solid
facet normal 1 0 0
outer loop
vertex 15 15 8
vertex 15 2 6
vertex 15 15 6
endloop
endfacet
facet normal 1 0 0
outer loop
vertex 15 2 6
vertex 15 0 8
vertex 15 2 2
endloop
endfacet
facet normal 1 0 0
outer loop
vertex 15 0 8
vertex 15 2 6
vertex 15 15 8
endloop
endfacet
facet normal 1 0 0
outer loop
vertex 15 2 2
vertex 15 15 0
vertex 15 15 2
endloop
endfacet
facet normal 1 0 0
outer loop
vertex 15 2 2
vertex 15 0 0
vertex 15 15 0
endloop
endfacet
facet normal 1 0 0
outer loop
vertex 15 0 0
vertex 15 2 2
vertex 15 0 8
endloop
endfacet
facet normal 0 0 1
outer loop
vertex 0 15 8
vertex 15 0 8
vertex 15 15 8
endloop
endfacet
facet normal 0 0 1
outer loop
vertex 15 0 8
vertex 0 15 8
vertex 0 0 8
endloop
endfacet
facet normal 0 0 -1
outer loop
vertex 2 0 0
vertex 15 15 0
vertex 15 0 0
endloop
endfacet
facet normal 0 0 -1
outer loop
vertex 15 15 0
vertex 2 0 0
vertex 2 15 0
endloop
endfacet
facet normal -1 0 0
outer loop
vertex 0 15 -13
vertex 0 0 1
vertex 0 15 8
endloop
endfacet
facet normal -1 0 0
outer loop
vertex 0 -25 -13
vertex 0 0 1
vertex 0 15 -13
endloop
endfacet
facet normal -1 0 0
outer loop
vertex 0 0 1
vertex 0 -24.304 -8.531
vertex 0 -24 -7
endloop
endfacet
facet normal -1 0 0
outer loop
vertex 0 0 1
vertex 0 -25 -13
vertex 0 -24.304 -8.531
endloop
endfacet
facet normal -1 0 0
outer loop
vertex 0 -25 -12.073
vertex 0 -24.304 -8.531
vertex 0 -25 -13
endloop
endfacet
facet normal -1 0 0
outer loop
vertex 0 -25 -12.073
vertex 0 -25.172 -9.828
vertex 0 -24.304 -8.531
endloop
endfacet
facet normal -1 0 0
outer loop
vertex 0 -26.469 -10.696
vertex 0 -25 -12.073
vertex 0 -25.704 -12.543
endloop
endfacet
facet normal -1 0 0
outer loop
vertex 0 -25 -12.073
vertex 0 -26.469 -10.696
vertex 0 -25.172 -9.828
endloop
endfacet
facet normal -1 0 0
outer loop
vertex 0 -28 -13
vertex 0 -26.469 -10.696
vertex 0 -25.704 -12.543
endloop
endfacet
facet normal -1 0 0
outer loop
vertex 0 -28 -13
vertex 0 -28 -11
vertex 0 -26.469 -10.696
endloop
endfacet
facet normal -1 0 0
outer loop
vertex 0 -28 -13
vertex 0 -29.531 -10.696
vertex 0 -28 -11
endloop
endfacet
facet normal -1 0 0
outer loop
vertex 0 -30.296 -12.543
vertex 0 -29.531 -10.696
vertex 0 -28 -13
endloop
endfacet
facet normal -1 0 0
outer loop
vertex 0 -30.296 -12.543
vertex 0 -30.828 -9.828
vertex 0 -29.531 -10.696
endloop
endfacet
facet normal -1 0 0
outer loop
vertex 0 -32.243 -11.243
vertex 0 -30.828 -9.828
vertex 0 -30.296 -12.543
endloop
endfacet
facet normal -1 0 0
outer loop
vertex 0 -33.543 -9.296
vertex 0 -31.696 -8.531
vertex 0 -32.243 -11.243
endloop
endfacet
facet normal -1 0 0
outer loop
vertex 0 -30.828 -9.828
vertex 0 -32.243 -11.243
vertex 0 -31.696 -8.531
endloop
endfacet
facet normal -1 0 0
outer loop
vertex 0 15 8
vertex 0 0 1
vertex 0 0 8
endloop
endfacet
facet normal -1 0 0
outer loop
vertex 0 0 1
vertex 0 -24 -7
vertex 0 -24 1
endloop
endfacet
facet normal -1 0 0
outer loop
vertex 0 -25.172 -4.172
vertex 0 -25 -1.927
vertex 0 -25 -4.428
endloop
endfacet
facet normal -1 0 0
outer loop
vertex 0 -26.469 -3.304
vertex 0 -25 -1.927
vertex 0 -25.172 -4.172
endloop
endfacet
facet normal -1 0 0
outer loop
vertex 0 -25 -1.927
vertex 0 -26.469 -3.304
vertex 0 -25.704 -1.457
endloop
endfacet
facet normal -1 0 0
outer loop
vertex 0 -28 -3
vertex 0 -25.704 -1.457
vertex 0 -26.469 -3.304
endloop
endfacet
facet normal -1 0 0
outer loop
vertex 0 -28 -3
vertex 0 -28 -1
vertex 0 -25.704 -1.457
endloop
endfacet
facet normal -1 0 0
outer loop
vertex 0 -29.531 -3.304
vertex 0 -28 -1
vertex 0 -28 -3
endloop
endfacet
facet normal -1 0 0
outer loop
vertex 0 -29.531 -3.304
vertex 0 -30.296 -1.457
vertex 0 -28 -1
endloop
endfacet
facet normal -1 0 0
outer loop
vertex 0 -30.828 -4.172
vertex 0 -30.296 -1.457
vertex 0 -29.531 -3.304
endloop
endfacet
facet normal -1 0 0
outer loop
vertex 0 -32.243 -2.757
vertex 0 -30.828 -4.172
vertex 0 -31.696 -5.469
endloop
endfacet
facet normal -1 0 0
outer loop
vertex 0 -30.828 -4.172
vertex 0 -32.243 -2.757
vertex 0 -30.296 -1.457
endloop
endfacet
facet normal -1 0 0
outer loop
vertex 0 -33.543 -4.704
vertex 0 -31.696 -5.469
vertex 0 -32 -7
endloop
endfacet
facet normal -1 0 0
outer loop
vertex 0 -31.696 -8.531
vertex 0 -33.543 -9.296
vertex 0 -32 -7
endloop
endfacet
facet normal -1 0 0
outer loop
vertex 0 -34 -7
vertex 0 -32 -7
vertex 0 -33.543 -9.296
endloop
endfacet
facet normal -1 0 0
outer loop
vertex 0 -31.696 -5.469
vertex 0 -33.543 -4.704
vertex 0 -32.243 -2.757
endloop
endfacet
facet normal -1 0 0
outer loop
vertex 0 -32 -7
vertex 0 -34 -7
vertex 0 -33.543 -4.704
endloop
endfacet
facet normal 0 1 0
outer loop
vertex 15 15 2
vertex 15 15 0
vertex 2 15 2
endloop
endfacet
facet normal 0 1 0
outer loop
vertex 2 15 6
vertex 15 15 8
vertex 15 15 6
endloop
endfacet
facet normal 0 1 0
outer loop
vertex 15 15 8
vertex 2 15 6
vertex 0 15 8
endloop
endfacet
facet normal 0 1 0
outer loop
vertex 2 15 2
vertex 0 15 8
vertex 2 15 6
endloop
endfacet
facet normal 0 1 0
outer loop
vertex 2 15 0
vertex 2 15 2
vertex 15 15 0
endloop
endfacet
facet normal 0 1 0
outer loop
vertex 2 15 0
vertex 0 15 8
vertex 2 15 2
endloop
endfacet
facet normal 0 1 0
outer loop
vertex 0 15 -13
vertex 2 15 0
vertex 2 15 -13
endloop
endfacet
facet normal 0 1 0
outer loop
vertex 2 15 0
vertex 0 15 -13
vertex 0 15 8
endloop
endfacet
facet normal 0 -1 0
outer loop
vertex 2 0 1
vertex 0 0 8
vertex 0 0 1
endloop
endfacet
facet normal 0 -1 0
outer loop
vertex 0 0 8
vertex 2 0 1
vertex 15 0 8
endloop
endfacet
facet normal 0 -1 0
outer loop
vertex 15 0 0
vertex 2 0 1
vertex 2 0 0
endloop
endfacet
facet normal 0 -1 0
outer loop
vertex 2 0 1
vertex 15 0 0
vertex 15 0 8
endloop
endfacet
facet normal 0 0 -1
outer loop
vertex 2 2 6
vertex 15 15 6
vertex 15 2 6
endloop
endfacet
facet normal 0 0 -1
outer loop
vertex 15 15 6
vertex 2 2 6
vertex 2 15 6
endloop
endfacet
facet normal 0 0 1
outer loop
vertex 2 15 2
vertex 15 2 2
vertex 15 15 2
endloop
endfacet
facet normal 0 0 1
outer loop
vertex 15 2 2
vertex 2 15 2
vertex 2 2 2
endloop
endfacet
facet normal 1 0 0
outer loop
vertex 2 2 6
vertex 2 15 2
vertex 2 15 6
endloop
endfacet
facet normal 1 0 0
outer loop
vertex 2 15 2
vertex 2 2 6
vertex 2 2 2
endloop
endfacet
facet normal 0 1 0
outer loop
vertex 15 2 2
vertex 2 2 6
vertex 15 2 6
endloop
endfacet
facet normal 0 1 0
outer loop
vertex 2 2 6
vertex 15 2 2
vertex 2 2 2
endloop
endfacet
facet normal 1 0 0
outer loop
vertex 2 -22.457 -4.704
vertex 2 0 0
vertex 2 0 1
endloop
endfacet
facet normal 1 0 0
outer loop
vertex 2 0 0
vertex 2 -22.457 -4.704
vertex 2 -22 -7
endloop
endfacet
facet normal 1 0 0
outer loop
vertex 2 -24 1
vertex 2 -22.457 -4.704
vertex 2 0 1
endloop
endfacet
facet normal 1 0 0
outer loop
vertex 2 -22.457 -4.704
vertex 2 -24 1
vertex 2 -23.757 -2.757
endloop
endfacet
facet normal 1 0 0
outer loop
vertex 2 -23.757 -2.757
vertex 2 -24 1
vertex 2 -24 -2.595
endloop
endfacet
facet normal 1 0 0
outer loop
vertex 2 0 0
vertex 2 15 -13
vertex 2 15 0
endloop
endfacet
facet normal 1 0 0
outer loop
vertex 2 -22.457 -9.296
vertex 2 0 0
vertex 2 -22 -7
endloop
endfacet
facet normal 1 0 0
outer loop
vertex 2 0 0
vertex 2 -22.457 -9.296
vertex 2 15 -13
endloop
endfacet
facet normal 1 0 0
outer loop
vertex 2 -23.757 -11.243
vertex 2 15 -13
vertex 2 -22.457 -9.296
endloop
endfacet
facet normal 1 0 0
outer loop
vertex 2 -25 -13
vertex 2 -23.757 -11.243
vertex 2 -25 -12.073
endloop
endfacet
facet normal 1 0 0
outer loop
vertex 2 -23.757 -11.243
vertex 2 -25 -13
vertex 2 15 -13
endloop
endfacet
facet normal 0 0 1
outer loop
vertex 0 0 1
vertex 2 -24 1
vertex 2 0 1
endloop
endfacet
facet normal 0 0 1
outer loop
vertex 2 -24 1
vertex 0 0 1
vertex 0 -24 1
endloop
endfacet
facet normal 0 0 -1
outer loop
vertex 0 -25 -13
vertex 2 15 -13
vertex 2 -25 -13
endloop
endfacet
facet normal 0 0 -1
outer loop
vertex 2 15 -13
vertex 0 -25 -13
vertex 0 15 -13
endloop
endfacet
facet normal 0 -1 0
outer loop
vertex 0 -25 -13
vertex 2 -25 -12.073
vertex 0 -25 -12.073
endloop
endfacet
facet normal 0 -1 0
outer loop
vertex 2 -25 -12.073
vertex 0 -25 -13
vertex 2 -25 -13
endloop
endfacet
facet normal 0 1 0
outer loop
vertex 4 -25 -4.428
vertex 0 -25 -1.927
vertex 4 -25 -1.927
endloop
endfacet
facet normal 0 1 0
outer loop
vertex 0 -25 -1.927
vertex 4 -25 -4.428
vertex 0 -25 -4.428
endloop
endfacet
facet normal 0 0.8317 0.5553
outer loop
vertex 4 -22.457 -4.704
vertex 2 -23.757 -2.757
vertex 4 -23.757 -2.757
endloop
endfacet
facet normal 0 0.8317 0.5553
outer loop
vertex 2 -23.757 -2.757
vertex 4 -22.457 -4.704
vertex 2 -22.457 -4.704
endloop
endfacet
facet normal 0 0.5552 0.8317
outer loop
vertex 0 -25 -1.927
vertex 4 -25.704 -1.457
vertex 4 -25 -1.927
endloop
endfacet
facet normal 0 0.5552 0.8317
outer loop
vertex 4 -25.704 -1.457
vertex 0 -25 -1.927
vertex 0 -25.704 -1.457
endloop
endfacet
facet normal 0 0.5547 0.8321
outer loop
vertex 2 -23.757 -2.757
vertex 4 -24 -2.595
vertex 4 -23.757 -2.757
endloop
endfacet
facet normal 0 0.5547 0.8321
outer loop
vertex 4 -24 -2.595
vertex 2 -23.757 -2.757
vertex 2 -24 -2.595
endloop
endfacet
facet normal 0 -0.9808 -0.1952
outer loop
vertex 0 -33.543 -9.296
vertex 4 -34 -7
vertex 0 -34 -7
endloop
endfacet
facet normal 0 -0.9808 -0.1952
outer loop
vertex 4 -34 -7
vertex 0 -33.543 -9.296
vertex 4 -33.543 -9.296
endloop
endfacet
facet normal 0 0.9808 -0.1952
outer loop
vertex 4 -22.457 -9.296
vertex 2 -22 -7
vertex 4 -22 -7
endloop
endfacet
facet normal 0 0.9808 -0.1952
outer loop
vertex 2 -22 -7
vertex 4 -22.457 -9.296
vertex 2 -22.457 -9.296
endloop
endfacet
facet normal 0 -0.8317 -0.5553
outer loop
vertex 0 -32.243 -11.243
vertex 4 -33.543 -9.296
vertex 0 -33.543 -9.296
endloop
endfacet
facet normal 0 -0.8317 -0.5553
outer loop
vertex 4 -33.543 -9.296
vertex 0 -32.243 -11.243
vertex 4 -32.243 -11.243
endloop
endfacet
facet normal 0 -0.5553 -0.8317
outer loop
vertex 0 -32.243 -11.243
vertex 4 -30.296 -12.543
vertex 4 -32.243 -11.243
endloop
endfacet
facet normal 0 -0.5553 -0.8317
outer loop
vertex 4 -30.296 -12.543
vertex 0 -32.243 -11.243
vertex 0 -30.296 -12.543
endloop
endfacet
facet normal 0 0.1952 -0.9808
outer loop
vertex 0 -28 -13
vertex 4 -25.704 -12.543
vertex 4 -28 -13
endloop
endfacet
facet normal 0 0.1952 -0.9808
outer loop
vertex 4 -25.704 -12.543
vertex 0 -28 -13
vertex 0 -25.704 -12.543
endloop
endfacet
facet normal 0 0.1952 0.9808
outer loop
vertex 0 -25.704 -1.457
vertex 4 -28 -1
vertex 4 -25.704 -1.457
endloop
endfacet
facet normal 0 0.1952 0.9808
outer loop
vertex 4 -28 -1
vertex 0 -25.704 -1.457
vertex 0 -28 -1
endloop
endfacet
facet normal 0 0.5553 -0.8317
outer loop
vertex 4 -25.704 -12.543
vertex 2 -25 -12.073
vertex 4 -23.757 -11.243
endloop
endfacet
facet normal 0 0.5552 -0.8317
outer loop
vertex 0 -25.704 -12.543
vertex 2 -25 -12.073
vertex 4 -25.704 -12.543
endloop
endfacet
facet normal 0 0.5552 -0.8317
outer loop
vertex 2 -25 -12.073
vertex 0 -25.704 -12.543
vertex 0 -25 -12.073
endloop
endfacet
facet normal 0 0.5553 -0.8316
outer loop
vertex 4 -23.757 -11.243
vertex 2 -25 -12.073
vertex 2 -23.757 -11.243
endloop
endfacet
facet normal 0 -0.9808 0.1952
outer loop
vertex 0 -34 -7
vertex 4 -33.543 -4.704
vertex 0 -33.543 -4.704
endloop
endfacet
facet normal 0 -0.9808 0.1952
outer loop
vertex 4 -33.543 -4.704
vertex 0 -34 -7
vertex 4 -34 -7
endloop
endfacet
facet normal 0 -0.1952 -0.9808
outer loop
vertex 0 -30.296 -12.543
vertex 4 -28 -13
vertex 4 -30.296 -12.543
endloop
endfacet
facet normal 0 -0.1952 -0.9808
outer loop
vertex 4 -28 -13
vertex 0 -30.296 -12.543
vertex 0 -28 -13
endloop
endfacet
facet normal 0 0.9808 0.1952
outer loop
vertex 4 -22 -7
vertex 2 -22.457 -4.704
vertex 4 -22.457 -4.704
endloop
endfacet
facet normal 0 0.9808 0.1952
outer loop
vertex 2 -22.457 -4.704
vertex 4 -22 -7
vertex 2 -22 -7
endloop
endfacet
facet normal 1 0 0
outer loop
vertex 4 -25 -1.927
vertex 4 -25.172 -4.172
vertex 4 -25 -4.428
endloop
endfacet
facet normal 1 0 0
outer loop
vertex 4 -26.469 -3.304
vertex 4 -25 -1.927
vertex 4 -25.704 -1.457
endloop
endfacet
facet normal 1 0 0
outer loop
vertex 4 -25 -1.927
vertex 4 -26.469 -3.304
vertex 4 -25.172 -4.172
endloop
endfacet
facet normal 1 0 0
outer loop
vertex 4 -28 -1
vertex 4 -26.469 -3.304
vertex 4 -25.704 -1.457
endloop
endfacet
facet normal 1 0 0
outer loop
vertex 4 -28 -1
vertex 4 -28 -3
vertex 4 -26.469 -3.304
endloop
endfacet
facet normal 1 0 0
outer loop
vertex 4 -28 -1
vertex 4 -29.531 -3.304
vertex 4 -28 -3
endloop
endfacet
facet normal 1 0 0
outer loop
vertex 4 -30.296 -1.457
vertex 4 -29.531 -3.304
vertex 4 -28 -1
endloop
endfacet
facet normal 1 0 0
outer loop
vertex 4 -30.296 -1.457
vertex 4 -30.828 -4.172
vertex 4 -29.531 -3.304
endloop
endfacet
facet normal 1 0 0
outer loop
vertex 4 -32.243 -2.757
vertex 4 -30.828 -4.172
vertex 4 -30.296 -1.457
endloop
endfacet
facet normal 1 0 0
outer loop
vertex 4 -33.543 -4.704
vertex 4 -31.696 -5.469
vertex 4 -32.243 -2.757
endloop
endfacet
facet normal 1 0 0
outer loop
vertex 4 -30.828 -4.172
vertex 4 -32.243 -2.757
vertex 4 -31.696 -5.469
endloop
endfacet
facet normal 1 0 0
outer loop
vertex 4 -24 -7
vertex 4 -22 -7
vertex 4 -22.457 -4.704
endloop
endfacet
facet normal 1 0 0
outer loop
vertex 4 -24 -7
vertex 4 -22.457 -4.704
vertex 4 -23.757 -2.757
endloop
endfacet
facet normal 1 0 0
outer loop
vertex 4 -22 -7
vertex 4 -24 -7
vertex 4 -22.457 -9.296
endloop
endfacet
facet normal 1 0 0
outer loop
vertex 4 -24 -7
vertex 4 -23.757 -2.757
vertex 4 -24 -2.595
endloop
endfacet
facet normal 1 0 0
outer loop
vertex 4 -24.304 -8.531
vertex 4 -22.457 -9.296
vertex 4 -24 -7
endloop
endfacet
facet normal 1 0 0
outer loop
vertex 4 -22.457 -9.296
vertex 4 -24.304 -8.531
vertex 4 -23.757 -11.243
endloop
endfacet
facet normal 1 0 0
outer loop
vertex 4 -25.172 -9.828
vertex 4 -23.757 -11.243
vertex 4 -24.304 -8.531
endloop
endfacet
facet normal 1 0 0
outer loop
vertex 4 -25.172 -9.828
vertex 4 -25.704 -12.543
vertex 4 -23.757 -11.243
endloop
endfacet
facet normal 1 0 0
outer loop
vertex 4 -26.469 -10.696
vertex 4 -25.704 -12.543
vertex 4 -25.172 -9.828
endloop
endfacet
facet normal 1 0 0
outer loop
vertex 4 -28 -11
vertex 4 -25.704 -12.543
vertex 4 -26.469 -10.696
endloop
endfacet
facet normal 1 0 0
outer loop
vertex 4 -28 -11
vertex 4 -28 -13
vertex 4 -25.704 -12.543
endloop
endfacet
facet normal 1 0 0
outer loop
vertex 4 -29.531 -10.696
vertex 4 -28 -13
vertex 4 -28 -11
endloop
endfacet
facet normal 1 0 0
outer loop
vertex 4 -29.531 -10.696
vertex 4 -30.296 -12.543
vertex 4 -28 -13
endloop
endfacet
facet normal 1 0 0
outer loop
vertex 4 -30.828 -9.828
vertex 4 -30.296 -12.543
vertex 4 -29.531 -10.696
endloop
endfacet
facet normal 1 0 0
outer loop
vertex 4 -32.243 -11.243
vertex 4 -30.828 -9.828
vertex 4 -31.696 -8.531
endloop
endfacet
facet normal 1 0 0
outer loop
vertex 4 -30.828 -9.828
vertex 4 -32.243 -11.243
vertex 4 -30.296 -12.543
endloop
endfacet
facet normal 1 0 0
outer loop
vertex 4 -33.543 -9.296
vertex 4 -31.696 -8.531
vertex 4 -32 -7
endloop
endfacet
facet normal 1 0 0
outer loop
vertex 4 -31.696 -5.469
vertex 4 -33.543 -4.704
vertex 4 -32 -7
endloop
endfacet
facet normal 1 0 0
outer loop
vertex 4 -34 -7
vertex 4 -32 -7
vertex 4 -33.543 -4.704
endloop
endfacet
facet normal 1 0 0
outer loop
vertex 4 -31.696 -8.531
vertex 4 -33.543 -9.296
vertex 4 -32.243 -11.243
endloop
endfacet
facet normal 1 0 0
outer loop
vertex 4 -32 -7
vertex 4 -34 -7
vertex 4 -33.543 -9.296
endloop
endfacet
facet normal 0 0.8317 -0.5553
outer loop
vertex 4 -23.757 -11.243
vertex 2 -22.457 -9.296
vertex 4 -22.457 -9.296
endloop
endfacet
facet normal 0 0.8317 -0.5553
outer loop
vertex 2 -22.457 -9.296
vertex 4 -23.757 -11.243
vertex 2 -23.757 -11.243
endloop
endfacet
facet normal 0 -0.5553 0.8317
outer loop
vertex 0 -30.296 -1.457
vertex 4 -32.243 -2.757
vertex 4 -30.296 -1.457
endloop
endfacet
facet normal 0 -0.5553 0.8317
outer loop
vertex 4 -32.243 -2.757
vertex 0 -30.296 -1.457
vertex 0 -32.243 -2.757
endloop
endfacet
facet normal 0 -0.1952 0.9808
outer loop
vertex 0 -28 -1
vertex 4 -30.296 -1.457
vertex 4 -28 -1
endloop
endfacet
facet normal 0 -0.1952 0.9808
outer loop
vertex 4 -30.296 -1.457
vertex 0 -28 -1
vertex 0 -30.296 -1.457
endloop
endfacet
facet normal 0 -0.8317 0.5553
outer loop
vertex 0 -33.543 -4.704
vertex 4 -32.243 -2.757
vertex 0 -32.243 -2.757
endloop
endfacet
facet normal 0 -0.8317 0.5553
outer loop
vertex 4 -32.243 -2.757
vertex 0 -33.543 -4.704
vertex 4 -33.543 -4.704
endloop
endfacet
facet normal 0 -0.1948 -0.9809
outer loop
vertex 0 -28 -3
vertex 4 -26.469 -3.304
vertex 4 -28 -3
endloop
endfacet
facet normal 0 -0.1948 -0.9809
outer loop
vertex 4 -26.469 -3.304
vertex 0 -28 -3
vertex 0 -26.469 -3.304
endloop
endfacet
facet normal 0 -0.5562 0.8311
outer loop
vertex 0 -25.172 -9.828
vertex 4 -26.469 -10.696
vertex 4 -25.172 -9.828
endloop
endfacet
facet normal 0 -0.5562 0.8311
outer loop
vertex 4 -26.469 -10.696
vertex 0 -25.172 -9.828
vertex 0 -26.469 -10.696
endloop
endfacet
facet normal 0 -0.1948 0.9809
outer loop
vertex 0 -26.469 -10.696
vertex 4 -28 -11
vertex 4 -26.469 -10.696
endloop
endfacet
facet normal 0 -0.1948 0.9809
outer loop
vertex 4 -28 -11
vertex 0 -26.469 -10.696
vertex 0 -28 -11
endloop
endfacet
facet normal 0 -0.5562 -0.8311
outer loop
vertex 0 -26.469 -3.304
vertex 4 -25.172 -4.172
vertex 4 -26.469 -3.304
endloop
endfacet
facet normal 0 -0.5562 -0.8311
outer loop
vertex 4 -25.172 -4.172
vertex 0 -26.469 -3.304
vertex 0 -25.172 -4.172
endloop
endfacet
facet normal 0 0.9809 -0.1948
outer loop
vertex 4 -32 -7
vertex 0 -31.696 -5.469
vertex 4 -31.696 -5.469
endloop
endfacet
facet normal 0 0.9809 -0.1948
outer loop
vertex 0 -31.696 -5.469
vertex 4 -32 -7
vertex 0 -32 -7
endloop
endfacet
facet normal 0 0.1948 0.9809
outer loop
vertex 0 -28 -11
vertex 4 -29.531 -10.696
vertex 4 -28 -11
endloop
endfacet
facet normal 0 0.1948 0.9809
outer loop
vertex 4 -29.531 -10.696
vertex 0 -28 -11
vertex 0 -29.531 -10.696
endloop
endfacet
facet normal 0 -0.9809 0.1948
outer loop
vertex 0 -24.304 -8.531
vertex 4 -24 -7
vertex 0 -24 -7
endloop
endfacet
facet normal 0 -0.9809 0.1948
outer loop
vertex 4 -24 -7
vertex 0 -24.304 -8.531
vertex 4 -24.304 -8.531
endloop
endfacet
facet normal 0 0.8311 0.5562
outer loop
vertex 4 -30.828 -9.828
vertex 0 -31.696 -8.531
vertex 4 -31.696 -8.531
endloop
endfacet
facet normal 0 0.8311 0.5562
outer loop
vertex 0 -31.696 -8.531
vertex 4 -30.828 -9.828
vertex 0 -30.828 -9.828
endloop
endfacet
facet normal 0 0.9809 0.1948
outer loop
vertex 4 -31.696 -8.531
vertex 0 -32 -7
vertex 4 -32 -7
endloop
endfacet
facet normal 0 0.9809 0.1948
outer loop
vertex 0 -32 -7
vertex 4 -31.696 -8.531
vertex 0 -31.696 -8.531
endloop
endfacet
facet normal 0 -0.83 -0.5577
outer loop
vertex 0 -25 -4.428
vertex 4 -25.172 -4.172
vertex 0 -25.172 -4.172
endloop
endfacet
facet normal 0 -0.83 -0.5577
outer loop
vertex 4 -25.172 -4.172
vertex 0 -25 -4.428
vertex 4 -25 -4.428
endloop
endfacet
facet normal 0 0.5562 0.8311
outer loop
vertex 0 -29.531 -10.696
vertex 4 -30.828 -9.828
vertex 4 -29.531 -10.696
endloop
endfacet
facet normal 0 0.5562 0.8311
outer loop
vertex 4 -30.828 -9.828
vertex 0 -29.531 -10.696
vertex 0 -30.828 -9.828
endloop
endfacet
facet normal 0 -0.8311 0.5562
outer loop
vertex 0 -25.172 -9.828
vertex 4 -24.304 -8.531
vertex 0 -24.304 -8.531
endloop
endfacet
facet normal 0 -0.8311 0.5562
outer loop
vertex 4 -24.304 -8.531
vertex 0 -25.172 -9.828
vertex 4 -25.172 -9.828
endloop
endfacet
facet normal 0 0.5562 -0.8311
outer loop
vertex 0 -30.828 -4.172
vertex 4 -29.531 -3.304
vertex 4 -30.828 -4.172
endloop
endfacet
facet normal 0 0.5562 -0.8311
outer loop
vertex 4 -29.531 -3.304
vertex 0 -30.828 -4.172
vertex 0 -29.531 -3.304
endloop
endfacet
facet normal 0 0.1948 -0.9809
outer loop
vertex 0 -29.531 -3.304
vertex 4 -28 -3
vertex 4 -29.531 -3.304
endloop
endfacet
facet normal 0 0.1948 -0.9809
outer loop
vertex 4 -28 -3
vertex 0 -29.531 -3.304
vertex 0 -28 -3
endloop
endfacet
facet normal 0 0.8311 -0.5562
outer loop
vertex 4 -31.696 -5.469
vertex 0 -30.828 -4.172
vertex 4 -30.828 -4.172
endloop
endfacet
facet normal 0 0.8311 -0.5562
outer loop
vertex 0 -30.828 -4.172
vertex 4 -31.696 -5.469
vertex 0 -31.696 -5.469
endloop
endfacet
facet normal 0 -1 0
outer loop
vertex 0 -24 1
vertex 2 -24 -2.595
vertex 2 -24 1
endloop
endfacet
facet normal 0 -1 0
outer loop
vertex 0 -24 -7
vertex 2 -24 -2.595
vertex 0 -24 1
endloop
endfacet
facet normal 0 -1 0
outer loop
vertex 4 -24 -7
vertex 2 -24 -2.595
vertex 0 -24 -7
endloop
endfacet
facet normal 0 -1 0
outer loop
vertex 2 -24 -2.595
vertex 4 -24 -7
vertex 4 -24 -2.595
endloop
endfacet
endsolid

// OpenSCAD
// Tolerance between moving parts
T  = 0.2;   // [0.1:0.05:0.5]
T2 = T / 2; // Half of the part tolerance

S  = 4;     // Steel thickness
P  = 2 + 0; // Perimeter wall thickness

$fn = 16;


/***************************************
 *  Layout all the parts for printing  *
 ***************************************
 */

/* */
head_dynamic();
/* */

/* * /
head_static();
/* */

/************************************
 *  Modules for building each part  *
 ************************************
 */

module head_dynamic() {
	x = 15;
	y = 15;
	d = 30;
	r = 4;

	// Clip
	difference() {
		cube([x, y, S+2*P]);
		translate([P, P, P])
			cube([x, y, S]);
	}

	// Pot shaft plate
	translate([0, P-d, -7]) {
		difference() {
			union() {
				translate([0, r-1, -r-P])
					cube([P, d+y-r-P+1, 12+P]); // Main plate
				rotate(90, [0,1,0])
					cylinder(r=r+P, h=P*2); // Flex clip
			}

			translate([-1, 0, 0])
				rotate(90, [0,1,0]) {
					cylinder(r=r, h=P*2+2); // Center hole

					translate([-r-r-1, r-1, 0])
						cube([r+r+1, 1, P*2+2]); // Flex cutout

					/*
					difference() { // Corner rounder
						translate([-10, -10, 0])
							cube([16, 10, P+2]);
						translate([0, 0, -2])
							cylinder(r=r+P, h=P+4);
					}

					translate([-r-r-P-P, -1, 0])
						cube([r+P, d-P+1, P+2]); // Flatten top
					*/
				}
		}
	}
}

module head_static() {
	x = 10;
	y = 20;
	d = 15;

	// Clip
	difference() {
		translate([0, -P, -P])
			cube([x, y, S+2*P]);
		translate([-1, 0, 0])
			cube([x+2, y, S]);
	}

	// Extension arm
	translate([0, -d-12, S])
		cube([x, d+12, P]);

	// Pot mounting plate
	translate([x-P, -d, -8.5]) {
		difference() {
			translate([0 , -12, -10])
				cube([P, 25+P, 10+12.5+P]); // Main plate

			translate([-1, 0, 0])
				rotate(90, [0,1,0])
					cylinder(d=8, h=P+2); // Center hole

			translate([-1 , -1-12, -1.5])
				cube([P+2, 2+1, 3]); // Key notch
		}
	}
}
